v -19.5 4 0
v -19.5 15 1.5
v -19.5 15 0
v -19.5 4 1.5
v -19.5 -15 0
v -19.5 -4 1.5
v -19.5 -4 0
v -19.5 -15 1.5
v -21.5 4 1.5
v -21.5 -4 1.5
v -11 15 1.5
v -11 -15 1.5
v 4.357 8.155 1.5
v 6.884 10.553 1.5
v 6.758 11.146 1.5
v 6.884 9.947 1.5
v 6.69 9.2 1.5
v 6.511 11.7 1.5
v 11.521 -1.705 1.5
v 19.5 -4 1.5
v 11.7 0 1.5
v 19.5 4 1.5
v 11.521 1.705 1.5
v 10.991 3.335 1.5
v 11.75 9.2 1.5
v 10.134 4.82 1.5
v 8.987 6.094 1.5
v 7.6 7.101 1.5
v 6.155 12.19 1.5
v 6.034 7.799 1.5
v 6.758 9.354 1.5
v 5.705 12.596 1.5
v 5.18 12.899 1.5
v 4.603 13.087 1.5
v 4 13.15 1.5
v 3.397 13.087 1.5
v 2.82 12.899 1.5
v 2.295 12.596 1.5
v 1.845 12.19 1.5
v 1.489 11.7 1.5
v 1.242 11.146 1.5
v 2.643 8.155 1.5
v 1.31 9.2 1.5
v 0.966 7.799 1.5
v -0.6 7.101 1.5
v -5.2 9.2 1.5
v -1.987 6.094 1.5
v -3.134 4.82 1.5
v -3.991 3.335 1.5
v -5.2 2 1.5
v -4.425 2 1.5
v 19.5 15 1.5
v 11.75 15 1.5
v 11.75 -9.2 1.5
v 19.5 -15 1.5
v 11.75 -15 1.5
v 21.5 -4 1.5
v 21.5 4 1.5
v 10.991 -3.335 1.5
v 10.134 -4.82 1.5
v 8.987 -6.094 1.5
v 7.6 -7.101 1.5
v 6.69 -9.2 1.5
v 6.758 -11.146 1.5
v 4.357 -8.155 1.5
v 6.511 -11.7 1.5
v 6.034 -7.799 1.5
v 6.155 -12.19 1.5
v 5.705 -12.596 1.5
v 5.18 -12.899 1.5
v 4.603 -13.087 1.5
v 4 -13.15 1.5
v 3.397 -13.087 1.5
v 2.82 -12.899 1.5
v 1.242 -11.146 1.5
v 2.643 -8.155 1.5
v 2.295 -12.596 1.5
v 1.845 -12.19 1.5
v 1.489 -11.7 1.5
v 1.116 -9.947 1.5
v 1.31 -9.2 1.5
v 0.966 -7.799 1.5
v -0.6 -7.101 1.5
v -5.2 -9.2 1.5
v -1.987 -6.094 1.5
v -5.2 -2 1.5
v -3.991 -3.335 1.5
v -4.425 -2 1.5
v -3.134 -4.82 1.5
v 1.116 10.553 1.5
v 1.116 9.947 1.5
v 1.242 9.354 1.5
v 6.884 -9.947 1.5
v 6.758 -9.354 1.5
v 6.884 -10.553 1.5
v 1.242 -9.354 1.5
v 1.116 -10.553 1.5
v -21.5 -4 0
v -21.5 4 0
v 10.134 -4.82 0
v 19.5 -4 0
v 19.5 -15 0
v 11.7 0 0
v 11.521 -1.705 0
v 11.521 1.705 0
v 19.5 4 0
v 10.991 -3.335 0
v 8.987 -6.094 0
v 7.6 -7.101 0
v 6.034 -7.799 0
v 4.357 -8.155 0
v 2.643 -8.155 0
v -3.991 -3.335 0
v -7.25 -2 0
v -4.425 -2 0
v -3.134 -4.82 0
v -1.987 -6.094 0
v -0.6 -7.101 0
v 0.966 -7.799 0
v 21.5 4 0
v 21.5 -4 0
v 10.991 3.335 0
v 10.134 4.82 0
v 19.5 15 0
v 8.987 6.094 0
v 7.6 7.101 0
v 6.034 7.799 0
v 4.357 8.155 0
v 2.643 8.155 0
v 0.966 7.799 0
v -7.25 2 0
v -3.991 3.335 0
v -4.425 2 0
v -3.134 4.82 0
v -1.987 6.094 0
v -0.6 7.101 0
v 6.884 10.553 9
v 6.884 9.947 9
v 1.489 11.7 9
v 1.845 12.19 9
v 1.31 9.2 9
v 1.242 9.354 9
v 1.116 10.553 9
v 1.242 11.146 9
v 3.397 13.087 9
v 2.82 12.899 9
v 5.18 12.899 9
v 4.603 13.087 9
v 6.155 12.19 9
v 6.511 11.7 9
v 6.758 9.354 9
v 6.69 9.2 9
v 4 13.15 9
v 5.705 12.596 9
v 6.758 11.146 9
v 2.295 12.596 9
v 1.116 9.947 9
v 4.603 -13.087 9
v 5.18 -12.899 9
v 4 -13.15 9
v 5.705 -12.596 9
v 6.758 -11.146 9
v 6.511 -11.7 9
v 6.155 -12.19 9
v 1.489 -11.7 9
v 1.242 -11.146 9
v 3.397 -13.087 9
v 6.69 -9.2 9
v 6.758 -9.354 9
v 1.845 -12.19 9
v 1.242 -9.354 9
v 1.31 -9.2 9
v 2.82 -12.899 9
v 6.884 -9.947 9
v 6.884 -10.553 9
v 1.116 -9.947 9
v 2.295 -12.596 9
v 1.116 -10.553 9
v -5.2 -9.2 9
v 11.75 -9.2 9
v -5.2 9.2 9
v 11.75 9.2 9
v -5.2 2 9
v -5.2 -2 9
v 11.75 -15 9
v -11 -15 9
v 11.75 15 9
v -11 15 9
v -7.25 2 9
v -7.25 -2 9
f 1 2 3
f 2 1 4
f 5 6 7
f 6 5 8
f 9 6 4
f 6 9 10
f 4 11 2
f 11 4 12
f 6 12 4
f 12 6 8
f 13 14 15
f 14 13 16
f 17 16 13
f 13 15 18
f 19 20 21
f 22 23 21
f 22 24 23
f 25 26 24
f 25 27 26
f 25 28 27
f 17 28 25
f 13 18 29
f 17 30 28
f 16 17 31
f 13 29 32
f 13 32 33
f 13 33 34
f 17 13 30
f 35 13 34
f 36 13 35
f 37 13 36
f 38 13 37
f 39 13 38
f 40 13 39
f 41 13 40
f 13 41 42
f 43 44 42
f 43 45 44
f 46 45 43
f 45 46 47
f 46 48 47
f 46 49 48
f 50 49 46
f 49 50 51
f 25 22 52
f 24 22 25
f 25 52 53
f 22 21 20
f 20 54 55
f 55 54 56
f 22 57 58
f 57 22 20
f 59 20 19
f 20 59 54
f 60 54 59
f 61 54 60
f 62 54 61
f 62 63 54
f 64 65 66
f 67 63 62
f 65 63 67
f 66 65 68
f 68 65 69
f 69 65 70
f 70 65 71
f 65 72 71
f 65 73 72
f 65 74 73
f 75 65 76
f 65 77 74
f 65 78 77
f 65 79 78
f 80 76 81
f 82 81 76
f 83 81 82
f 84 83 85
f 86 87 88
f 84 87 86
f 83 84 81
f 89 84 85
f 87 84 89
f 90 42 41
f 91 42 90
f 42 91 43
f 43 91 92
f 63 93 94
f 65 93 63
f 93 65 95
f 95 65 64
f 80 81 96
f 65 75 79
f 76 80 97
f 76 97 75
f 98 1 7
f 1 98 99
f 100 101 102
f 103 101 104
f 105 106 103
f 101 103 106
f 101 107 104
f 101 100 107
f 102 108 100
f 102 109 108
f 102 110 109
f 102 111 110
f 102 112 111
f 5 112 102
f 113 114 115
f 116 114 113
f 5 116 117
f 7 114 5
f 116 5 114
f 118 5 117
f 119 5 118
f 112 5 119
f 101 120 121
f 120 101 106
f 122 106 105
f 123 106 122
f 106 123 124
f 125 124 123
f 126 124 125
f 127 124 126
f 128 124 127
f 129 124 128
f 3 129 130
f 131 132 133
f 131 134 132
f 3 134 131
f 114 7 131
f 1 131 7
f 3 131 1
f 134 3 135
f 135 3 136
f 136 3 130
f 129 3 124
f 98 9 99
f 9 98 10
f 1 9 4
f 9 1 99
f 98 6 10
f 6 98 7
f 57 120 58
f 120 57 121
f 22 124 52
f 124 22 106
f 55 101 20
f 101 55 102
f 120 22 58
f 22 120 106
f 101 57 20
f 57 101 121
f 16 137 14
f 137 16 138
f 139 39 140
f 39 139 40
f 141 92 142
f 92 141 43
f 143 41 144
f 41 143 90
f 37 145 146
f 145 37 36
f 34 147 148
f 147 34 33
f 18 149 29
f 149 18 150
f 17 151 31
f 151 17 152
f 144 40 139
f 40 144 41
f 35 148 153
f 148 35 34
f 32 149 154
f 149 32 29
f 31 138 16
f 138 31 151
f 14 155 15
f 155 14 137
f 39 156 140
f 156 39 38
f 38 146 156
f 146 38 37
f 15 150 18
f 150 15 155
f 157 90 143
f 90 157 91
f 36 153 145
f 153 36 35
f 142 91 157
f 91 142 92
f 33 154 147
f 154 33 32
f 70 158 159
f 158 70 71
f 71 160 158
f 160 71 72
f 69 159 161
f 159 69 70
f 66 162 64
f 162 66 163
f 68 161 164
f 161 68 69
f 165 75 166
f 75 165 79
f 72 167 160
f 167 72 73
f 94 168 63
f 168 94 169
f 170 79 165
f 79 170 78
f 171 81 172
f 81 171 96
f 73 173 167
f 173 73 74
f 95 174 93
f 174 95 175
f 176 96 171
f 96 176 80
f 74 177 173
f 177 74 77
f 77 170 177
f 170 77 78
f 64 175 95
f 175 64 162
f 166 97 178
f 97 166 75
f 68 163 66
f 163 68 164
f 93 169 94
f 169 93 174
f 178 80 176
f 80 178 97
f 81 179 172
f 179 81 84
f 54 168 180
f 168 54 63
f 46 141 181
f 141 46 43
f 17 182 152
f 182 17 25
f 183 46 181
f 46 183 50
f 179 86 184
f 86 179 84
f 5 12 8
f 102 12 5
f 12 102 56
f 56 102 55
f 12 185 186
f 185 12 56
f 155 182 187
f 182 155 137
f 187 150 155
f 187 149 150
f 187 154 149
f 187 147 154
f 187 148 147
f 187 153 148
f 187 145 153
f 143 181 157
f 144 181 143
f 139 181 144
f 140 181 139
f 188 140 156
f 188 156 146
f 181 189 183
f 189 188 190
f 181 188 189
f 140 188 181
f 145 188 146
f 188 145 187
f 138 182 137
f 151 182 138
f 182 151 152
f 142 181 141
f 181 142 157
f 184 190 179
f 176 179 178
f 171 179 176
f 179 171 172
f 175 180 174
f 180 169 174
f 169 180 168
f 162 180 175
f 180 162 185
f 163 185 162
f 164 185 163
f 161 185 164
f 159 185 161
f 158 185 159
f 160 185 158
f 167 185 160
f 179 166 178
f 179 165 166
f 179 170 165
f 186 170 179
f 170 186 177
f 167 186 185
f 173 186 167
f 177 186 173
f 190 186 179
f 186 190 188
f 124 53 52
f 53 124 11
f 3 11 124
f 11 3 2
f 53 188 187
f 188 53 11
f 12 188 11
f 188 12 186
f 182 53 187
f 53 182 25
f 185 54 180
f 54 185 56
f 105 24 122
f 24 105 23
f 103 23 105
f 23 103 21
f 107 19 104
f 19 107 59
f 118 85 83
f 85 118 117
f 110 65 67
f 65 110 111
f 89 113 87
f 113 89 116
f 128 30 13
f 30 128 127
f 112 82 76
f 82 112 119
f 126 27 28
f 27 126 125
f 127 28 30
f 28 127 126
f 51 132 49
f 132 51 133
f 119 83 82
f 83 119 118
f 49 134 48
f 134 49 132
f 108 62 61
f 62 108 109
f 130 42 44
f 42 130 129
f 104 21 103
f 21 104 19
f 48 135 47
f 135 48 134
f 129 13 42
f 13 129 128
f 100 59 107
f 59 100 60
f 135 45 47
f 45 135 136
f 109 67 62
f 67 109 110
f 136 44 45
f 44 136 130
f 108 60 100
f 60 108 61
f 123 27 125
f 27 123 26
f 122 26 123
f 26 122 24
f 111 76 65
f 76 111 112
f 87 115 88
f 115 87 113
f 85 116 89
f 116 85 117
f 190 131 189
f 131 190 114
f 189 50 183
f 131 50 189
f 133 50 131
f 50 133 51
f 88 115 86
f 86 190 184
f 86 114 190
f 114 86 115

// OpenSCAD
// file: dronePlates.scad
/**
 * dronePlates.scad
 * Plate library
 *
 * GNU GPL V3
 * @author: Victor Potenciano
 */

m3Rad = 3.4/2;
cornerR = 4;

/**
 *
 */
module helperDisk(diameter) {
	cylinder(r = diameter/2, h = 0.6, $fn=20);
}

/**
 *
 */
module roundedRect(size, radius) {
	x = size[0];
	y = size[1];
	z = size[2];

	linear_extrude(height=z)
	hull() {
	// place 4 circles in the corners, with the given radius
	translate([(-x/2)+(radius/2), (-y/2)+(radius/2), 0]){ circle(r=radius); }
	translate([(x/2)-(radius/2), (-y/2)+(radius/2), 0]){ circle(r=radius); }
	translate([(-x/2)+(radius/2), (y/2)-(radius/2), 0]){ circle(r=radius); }
	translate([(x/2)-(radius/2), (y/2)-(radius/2), 0]){ circle(r=radius); }
	}
}

/**
 * rounded rectangle triangle with corner at origin
 */
module roundedTriangle(size, radius) {
	x = size[0];
	y = size[1];
	z = size[2];

	linear_extrude(height=z)
	hull() {
	translate([radius, radius, 0]){ circle(r=radius); }
	translate([x-radius, radius, 0]){ circle(r=radius); }
	translate([radius, y-radius, 0]){ circle(r=radius); }
	}
}

/**
 *
 */
module roundRectPlate(w, l, plateThick=3) {
	difference(){
		roundedRect([l+m3Rad*1.75,w+m3Rad*1.75,plateThick], cornerR);
		translate([l/2, w/2, -0.5]) { cylinder(h = plateThick+1, r = m3Rad, $fn=30); }
		translate([-l/2, w/2, -0.5]) { cylinder(h = plateThick+1, r = m3Rad, $fn=30); }
		translate([l/2, -w/2, -0.5]) { cylinder(h = plateThick+1, r = m3Rad, $fn=30); }
		translate([-l/2, -w/2, -0.5]) { cylinder(h = plateThick+1, r = m3Rad, $fn=30); }
	}
}

/**
 *
 */
module crossSquarePlate(l, thick=3) {
	inDist = cornerR*2+4;
	trianL = sqrt((l*l)/2)-inDist;
	centerR = 4;

	difference(){
		roundRectPlate(l, l, thick);
		translate([0, centerR, -0.5]) { 
			rotate([0,0,45]){ roundedTriangle([trianL,trianL,thick+1], cornerR-2); }
		}
		translate([0, -centerR, -0.5]) { 
			rotate([0,0,225]){ roundedTriangle([trianL,trianL,thick+1], cornerR-2); }
		}
		translate([-centerR, 0, -0.5]) { 
			rotate([0,0,135]){ roundedTriangle([trianL,trianL,thick+1], cornerR-2); }
		}
		translate([centerR, 0, -0.5]) { 
			rotate([0,0,-45]){ roundedTriangle([trianL,trianL,thick+1], cornerR-2); }
		}
	}
}

/**
 *
 */
module hShapePlate(w, l, thick=4) {
	inDist = cornerR*2+1;

	difference(){
		roundRectPlate(w, l, thick);
		translate([0, w/4, -0.5]) { roundedRect([l-inDist,w/2-inDist,thick+1], cornerR-2); }
		translate([0, -w/4, -0.5]) { roundedRect([l-inDist,w/2-inDist,thick+1], cornerR-2); }
	}
}

/**
 *
 */
module motorCircleMount(inDia, outDia, thick=3, extraH=false, d1=19, d2=16, holeR=m3Rad ) {
	difference(){
		cylinder(h = thick, r = outDia/2, $fn=30);
		motorCircleMountHoles(inDia, outDia, thick, extraH, d1=d1, d2=d2, holeR=holeR);
	}
}

/**
 *
 */
module motorCircleMountHoles(inDia, outDia, thick=3, extraH=false, d1=19, d2=16, d3=25, holeR=m3Rad) {
	translate([0, 0, -0.5]) { cylinder(h = thick+1, r = inDia/2, $fn=30); }

	for(i=[0:3]) {
		rotate([0,0,90*i]){
		translate([d1/2, 0, -0.5]) cylinder(h = thick+1, r = holeR, $fn=20);
		translate([d2/2, 0, -0.5]) cylinder(h = thick+1, r = holeR, $fn=20);
		translate([d2/2, -holeR, -0.5]) cube(size = [(d1-d2)/2,holeR*2,thick+1]);
		}
	}
	
	if(extraH==true){	
		for(i=[-1,1]) translate([i*d3/2, 0, -0.5]) { cylinder(h = thick+1, r = holeR, $fn=30); }
	}
}

/**
 *
 */
module motorRectMount(w, l, inDia, thick=3) {
	d1=19;
	d2=16;

	difference(){
		roundRectPlate(w, l, thick);
		translate([0, 0, -0.5]) { cylinder(h = thick+1, r = inDia/2, $fn=30); }
		translate([0, d1/2, -0.5]) { cylinder(h = thick+1, r = m3Rad, $fn=30); }
		translate([0, -d1/2, -0.5]) { cylinder(h = thick+1, r = m3Rad, $fn=30); }
		translate([d2/2, 0, -0.5]) { cylinder(h = thick+1, r = m3Rad, $fn=30); }
		translate([-d2/2, 0, -0.5]) { cylinder(h = thick+1, r = m3Rad, $fn=30); }
	}
}

/**
 *
 */
module tube(inDia, outDia, height) {
	difference(){
		cylinder(h = height, r = outDia/2, $fn=50);
		translate([0, 0, -0.5]) { cylinder(h = height+1, r = inDia/2, $fn=30); }
	}
}

/**
 *
 */
module squareTube(inDia, outDia, height) {
	translate([0,0,height/2]){
	difference(){
		cube(size = [outDia,outDia,height], center = true);
		cube(size = [inDia,inDia,height+1], center = true);
	}
	}
}

/**
 *
 */
module djiFlamewheelHoles(height) {
	a = 23;
	b = 16;
	c = 19.5;
	
	translate([a/2, c/2, 0]) { cylinder(h = height, r = m3Rad, $fn=30); }
	translate([-a/2, c/2, 0]) { cylinder(h = height, r = m3Rad, $fn=30); }
	translate([b/2, -c/2, 0]) { cylinder(h = height, r = m3Rad, $fn=30); }
	translate([-b/2, -c/2, 0]) { cylinder(h = height, r = m3Rad, $fn=30); }
}

/**
 *
 */
module djiFlamewheelHolesBotton(height) {
	a1 = 21;
	c = 19.5;
	
	translate([a1/2, c/2, 0]) { cylinder(h = height, r = m3Rad, $fn=30); }
	translate([-a1/2, c/2, 0]) { cylinder(h = height, r = m3Rad, $fn=30); }
}

/**
 *
 */
module propeller(size){
union(){
difference(){
	cylinder(h = 3, r = size/2, center=true, $fn=30);
	cylinder(h = 3.1, r = size/2-2, center=true, $fn=30); 
}
for( i = [-1,1] ){
rotate([0,0,45*i]){ cube(size = [size,4,1], center = true); }
}
}
}

/**
 *
 */
module slot(length, height, rad){
for(i=[-1,1]) translate([i*length/2,0,0]) cylinder(h = height, r = rad, $fn=30);
translate([0,0,height/2]) cube(size = [length,rad*2,height], center = true);
}

 

////////////////////////
// Examples:
////////////////////////

motorCircleMount(8, 25, 3.5);

//roundedRect([50,50,3], 4);

//hShapePlate(79, 25);

//rotate([0,0,45]){roundedTriangle([40,40,3], 4);}

//crossSquarePlate(45, 4);

/*
union(){
motorRectMount(21, 18, 8, 4);
translate([9, 10.5, 0]) {tube(m3Rad*2, 6.5, 6);}
}
*/

/*
difference(){
union(){
hShapePlate(50, 30, 3.5);
translate([-4,-25,0]){cube(size = [8,50,3.5]);}
rotate([0, 0, 45]) {motorCircleMount(8, 35, 3.5);}
}
cylinder(h = 10, r = 4, $fn=100, center=true);
}
*/

//rotate([90,0,0]){ tube(5,10,20); }
//translate([20,0,0]){ squareTube(5, 10, 20); }
// main file
/**
 * lt210 fpv camera mount
 */
 
use <dronePlates.scad>;

thick = 1.5;
hubSqH=10;
tolerance=0.4;

/***
difference(){
    union(){
    import("qav210_fpvcam.stl", convexity=4);
    translate([0,7,5]) cube(size=[19,4,9], center=true);
    }
    
    translate([0,-13.5,8.5]) cube(size=[16.75,2,10], center=true);
    translate([0,5,0]) cube(size=[2.5,2.5,20], center=true);
}
***/

/**
 *
 */
module cameraHub(tolerance=0){
sqL = 18;

translate([0,0,hubSqH/2]) cube(size=[sqL+tolerance,sqL+tolerance,hubSqH+tolerance], center=true);
cylinder(r=7.5+(tolerance/2), h=16, $fn=20);
for(i=[-1,1]) translate([i*10.25,0,0]) cylinder(h=hubSqH,r=2.7+(tolerance/2),$fn=30);
translate([0,0,16/2])cube(size=[3+tolerance,sqL+4+tolerance,16], center=true);
}//end module

/**
 *
 */
module housing(){
difference(){
cube(size=[30,30,hubSqH-2], center=true);
scale([1,1,1.1]) translate([0,0,-hubSqH/2]) cameraHub(tolerance=tolerance);
translate([0,13,0]) cube(size=[32+1,10+0.5,hubSqH], center=true);
}
}//end module


difference(){
    union(){
        translate([0,0,thick/2]) cube(size=[39,30,thick], center=true);
        for(i=[-1,1]) translate([i*20.5,0,thick/2]) cube(size=[2,8,thick], center=true);
        translate([4,0,hubSqH/2]) rotate([0,0,-90]) housing();
    }
    
    translate([3.5,0,0]) cylinder(r=8.2, h=20, center=true, $fn=30);
    translate([-5.75,0,0]) cube(size=[3,4,20], center=true);
    
}
